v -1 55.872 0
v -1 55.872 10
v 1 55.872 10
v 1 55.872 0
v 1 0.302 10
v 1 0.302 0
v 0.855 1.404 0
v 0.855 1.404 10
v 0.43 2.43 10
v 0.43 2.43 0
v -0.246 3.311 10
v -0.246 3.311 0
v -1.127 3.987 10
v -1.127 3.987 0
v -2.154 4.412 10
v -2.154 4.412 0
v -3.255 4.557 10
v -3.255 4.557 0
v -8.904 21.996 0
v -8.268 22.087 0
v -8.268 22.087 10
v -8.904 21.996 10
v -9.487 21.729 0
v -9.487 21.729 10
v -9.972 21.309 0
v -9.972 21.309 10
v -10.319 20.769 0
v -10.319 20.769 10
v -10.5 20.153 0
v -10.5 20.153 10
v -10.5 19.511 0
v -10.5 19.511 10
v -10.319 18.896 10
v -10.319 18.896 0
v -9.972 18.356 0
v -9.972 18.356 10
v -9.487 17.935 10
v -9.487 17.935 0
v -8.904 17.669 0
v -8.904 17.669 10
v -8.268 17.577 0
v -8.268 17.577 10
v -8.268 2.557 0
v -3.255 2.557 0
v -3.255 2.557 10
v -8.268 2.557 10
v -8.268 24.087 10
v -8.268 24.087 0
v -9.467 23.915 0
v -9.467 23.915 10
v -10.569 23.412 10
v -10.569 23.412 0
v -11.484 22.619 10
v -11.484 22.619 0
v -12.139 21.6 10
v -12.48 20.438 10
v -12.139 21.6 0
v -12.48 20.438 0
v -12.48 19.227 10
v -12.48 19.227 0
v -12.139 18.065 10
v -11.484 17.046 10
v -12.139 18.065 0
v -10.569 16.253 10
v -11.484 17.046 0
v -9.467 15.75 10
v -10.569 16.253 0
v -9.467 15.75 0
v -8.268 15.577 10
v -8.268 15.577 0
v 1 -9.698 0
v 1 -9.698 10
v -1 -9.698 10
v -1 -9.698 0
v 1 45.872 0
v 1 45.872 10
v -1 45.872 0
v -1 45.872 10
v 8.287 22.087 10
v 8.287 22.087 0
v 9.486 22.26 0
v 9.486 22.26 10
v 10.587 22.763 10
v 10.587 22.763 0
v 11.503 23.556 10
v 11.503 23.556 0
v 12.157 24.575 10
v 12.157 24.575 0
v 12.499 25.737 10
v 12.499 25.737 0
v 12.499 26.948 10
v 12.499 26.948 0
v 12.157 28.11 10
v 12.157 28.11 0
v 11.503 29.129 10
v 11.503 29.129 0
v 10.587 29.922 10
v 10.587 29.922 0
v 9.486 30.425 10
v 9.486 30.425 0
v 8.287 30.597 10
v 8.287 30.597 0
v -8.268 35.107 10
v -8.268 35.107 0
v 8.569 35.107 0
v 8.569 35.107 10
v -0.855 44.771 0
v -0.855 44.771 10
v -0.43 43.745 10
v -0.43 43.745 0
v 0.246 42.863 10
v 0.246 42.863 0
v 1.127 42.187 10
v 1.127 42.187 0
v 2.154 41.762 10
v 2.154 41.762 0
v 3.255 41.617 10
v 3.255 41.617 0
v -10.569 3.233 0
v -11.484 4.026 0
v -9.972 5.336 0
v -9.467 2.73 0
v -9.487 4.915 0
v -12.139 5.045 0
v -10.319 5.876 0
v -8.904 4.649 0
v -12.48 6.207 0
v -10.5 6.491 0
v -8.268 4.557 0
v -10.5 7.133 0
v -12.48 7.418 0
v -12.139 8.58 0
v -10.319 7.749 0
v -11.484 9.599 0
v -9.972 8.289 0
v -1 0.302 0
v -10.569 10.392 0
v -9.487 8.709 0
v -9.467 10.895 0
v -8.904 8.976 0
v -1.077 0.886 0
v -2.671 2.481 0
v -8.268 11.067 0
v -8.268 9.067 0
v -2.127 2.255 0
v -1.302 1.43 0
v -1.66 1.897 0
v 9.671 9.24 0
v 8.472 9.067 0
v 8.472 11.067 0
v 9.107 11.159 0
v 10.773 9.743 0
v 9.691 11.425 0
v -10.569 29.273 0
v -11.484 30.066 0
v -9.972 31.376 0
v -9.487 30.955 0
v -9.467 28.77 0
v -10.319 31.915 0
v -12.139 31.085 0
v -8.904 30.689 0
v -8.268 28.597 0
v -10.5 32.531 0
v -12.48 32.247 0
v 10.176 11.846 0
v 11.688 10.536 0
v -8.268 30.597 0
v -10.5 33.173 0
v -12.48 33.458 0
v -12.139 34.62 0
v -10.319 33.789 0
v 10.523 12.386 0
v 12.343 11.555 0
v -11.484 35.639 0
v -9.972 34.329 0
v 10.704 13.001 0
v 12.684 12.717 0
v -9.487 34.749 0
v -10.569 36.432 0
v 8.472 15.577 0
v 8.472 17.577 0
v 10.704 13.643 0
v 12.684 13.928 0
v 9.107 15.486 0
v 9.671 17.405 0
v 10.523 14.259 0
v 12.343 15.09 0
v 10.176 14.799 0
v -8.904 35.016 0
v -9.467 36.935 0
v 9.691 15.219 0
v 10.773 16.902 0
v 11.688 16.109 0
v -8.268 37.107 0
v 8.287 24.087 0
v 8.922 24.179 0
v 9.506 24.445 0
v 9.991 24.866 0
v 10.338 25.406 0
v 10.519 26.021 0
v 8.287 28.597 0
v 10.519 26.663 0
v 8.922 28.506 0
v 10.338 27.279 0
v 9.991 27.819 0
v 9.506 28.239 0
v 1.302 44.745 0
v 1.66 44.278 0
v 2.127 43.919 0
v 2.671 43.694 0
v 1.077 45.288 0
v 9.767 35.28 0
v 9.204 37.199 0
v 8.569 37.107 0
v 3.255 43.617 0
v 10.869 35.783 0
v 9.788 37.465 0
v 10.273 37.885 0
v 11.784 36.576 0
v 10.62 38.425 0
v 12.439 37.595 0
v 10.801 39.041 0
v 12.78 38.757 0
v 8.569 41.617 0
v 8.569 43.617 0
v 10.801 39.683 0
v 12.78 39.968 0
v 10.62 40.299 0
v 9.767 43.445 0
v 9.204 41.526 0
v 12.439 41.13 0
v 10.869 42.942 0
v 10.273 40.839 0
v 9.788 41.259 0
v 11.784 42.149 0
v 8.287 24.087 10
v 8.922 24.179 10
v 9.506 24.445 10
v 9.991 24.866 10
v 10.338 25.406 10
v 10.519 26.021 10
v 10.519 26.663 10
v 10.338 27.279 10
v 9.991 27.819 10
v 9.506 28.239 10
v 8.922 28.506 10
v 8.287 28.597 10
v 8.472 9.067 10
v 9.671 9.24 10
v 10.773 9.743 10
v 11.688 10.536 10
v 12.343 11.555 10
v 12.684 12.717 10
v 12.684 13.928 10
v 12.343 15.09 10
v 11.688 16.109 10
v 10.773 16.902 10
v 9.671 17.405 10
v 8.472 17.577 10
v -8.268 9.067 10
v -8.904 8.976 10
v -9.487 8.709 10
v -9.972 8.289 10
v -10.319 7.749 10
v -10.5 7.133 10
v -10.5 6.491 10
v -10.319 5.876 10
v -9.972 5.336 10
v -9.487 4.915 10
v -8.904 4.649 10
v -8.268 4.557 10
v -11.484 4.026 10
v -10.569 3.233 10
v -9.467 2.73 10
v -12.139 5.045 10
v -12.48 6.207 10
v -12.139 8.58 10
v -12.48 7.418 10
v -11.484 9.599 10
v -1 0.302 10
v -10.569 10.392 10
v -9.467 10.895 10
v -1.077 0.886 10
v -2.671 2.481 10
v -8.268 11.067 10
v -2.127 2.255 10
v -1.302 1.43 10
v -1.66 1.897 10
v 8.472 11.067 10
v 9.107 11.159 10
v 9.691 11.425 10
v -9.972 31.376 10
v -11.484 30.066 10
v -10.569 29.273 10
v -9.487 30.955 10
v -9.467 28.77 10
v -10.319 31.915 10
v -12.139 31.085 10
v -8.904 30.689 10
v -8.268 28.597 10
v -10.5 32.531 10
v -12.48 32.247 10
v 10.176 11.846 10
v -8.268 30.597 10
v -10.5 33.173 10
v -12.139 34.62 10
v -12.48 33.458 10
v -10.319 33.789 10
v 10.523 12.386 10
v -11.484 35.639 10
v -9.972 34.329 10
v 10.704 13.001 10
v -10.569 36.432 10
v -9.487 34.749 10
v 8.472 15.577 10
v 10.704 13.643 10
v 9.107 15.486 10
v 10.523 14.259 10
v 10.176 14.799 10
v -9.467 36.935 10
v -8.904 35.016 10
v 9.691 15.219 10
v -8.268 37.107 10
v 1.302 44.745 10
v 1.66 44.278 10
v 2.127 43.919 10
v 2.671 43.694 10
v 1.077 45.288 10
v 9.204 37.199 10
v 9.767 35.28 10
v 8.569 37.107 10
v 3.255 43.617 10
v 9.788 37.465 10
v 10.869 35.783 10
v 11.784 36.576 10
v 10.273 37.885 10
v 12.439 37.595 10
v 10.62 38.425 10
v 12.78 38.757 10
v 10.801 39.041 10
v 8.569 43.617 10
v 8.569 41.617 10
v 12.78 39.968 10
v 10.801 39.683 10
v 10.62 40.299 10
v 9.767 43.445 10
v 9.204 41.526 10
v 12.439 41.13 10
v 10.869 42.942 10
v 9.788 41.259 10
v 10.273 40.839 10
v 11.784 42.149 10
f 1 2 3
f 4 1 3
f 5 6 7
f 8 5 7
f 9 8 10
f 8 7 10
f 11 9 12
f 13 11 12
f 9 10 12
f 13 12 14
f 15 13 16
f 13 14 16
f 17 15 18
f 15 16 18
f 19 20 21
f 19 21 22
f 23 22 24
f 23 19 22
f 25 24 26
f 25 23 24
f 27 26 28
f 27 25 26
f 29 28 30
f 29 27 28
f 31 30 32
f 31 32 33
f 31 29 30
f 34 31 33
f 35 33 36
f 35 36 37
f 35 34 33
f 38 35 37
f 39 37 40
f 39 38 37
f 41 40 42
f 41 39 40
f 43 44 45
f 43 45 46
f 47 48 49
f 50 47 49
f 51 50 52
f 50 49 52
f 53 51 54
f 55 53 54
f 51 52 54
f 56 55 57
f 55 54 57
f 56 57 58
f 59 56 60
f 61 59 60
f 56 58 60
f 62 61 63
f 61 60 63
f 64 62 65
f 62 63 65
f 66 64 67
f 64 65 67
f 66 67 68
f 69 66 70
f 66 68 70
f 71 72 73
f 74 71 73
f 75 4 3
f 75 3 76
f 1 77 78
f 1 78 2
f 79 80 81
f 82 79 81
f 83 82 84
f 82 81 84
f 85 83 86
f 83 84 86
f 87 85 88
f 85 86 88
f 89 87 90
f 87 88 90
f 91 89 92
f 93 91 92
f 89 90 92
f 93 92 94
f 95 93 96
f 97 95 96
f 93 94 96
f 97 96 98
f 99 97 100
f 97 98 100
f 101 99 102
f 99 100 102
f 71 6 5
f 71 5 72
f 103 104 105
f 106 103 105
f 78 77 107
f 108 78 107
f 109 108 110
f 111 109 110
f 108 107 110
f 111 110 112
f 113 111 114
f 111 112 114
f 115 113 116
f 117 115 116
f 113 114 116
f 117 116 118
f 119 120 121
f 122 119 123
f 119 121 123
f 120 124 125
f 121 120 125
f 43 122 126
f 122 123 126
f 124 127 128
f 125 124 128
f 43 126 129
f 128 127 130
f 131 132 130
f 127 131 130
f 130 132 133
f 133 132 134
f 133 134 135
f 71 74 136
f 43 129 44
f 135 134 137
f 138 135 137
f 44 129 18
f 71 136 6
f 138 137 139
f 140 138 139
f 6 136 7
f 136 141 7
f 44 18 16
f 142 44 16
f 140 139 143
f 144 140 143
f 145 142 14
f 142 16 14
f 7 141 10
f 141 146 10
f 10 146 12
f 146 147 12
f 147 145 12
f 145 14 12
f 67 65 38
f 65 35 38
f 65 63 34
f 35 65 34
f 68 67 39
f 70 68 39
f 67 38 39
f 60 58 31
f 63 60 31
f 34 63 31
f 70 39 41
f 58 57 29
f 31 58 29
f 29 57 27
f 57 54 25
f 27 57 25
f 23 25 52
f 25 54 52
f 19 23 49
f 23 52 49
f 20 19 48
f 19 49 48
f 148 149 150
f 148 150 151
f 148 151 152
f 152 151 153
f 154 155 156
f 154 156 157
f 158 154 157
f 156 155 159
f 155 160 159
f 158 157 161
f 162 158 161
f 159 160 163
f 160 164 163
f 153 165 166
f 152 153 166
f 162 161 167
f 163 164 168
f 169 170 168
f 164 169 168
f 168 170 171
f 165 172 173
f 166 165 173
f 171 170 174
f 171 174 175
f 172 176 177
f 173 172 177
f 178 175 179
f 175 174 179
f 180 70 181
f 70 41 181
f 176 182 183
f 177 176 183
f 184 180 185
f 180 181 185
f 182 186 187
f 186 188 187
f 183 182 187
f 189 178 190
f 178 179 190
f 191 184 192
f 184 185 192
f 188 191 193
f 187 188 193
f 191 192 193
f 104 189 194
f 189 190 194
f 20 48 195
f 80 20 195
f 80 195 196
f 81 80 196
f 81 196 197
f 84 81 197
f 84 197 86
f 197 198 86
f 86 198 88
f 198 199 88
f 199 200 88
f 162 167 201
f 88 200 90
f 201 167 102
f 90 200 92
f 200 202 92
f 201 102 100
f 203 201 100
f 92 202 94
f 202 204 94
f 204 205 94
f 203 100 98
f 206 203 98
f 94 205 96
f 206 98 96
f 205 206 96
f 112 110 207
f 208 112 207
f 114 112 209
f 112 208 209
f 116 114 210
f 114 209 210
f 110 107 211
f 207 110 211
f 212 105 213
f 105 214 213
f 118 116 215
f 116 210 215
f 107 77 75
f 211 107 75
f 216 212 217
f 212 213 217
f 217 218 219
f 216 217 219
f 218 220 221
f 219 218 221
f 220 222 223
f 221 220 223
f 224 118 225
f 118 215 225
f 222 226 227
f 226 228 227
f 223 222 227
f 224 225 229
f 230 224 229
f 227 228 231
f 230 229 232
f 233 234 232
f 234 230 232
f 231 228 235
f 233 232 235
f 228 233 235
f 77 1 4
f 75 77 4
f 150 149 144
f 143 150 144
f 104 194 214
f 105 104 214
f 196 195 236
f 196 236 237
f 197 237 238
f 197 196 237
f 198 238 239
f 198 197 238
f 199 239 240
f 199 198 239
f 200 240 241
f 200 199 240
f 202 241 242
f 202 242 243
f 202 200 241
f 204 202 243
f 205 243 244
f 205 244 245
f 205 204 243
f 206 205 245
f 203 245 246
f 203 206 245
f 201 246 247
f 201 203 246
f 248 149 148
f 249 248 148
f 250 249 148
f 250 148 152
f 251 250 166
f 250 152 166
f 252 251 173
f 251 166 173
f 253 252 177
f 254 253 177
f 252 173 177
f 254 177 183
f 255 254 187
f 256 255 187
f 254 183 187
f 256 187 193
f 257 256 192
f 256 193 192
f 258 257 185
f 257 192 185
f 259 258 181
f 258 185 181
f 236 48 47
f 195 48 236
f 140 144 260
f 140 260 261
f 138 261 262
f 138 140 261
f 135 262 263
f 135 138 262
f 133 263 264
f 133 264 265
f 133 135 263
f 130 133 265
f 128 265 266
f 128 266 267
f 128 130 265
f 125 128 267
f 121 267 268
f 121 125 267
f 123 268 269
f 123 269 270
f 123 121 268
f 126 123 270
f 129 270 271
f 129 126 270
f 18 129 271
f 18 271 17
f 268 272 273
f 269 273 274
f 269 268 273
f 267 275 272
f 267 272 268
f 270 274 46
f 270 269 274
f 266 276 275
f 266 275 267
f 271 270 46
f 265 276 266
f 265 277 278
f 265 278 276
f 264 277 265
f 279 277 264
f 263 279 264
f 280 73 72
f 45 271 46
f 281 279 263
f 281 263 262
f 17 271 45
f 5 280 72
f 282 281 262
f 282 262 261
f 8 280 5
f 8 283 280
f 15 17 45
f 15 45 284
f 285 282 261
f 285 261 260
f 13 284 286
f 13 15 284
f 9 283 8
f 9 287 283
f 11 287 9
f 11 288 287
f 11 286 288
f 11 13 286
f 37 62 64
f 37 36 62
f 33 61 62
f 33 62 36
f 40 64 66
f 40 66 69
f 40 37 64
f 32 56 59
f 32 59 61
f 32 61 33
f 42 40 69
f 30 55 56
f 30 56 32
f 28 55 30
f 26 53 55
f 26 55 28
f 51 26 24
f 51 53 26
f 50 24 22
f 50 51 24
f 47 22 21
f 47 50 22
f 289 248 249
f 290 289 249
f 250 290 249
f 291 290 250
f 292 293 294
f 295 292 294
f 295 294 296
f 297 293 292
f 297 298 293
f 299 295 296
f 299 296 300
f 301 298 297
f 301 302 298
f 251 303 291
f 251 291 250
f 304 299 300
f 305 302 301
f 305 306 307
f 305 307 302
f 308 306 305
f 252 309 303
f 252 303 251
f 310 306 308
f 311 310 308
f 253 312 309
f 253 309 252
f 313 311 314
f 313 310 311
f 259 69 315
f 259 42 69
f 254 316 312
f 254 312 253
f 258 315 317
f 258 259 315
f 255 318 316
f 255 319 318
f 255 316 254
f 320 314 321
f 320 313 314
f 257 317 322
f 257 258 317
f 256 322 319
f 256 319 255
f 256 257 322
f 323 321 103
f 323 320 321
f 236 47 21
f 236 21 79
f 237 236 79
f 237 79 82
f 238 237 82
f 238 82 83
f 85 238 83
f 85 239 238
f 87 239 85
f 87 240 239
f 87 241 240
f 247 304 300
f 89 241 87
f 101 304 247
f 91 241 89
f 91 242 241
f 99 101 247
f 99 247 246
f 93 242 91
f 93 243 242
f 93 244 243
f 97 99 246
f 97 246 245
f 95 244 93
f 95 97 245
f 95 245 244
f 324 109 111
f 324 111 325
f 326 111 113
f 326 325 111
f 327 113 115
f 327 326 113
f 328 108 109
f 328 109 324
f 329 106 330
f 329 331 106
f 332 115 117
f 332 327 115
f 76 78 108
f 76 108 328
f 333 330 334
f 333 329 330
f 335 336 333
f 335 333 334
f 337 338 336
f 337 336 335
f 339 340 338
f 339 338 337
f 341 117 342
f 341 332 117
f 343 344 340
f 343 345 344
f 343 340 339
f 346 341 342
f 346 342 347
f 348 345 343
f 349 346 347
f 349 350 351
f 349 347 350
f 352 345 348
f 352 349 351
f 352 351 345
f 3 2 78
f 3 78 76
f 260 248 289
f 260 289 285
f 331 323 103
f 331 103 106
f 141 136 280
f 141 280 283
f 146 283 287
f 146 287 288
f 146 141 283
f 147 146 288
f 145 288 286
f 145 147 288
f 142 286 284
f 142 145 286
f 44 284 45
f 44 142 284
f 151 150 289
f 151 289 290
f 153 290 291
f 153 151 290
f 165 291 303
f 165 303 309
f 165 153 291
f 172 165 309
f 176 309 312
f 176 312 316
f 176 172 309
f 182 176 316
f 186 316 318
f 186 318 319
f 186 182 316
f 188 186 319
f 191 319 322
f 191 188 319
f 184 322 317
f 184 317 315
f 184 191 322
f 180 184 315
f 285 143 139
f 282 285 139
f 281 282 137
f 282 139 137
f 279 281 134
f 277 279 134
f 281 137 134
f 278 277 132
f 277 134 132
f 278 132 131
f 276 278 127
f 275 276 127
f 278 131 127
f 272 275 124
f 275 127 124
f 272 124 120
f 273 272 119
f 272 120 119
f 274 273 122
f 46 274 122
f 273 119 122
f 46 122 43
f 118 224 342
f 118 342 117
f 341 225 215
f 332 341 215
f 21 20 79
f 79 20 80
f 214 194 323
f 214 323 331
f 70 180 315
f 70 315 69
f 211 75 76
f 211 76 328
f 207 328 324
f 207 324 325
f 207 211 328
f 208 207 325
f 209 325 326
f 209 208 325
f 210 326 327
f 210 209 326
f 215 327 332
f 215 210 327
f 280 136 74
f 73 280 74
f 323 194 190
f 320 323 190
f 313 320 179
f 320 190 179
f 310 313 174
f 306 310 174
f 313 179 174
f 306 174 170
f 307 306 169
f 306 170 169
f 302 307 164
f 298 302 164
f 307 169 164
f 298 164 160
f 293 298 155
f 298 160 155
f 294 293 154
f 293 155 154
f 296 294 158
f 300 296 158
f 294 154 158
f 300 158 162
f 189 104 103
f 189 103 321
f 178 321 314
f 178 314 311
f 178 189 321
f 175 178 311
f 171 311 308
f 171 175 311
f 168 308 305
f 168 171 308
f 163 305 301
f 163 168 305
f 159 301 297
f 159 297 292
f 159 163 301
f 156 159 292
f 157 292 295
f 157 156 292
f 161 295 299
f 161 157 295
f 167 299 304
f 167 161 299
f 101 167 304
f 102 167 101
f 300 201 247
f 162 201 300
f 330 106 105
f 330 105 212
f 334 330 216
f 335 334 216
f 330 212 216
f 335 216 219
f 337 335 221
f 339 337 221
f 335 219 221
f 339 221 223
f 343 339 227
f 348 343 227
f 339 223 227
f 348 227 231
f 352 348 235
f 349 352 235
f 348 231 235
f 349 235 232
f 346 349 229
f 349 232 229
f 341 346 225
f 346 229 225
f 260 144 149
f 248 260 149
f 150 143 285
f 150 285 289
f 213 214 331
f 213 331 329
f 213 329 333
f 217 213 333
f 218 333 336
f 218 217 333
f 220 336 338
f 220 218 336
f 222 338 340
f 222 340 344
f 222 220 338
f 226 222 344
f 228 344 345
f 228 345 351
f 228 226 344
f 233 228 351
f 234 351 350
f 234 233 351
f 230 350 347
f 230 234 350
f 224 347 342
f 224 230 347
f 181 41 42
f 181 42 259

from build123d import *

# Parameters (mm, degrees)
PAD_DEPTH = 10


with BuildPart() as part:
    # Sketch → Pad (new body)
    with BuildSketch(Plane.XY):
        with BuildLine():
            ThreePointArc((-8.268261, 24.087282), (-12.523239, 19.832304), (-8.268261, 15.577326))
            Line((8.472095, 15.577326), (-8.268261, 15.577326))
            ThreePointArc((8.472095, 11.06737), (10.727073, 13.322348), (8.472095, 15.577326))
            Line((-8.268261, 11.06737), (8.472095, 11.06737))
            ThreePointArc((-8.268261, 11.06737), (-12.523239, 6.812392), (-8.268261, 2.557415))
            Line((-3.254978, 2.557415), (-8.268261, 2.557415))
            ThreePointArc((-1, 0.302437), (-1.660468, 1.896947), (-3.254978, 2.557415))
            Line((-1, 0.302437), (-1, -9.697563))
            Line((1, -9.697563), (-1, -9.697563))
            Line((1, 0.302437), (1, -9.697563))
            ThreePointArc((1, 0.302437), (-0.246254, 3.31116), (-3.254978, 4.557415))
            Line((-8.268261, 4.557415), (-3.254978, 4.557415))
            ThreePointArc((-8.268261, 9.06737), (-10.523239, 6.812392), (-8.268261, 4.557415))
            Line((-8.268261, 9.06737), (8.472095, 9.06737))
            ThreePointArc((8.472095, 9.06737), (12.727073, 13.322348), (8.472095, 17.577326))
            Line((-8.268261, 17.577326), (8.472095, 17.577326))
            ThreePointArc((-8.268261, 22.087282), (-10.523239, 19.832304), (-8.268261, 17.577326))
            Line((-8.268261, 22.087282), (8.286925, 22.087282))
            ThreePointArc((8.286925, 22.087282), (12.541903, 26.34226), (8.286925, 30.597238))
            Line((-8.268261, 30.597238), (8.286925, 30.597238))
            ThreePointArc((-8.268261, 35.107193), (-10.523239, 32.852215), (-8.268261, 30.597238))
            Line((-8.268261, 35.107193), (8.568532, 35.107193))
            ThreePointArc((8.568532, 35.107193), (12.82351, 39.362171), (8.568532, 43.617149))
            Line((8.568532, 43.617149), (3.254978, 43.617149))
            ThreePointArc((1, 45.872127), (1.660468, 44.277617), (3.254978, 43.617149))
            Line((1, 55.872127), (1, 45.872127))
            Line((-1, 55.872127), (1, 55.872127))
            Line((-1, 45.872127), (-1, 55.872127))
            ThreePointArc((-1, 45.872127), (0.246254, 42.863403), (3.254978, 41.617149))
            Line((8.568532, 41.617149), (3.254978, 41.617149))
            ThreePointArc((8.568532, 37.107193), (10.82351, 39.362171), (8.568532, 41.617149))
            Line((-8.268261, 37.107193), (8.568532, 37.107193))
            ThreePointArc((-8.268261, 37.107193), (-12.523239, 32.852215), (-8.268261, 28.597238))
            Line((8.286925, 28.597238), (-8.268261, 28.597238))
            ThreePointArc((8.286925, 24.087282), (10.541903, 26.34226), (8.286925, 28.597238))
            Line((-8.268261, 24.087282), (8.286925, 24.087282))
        make_face()
    extrude(amount=PAD_DEPTH)


solid = part.part
